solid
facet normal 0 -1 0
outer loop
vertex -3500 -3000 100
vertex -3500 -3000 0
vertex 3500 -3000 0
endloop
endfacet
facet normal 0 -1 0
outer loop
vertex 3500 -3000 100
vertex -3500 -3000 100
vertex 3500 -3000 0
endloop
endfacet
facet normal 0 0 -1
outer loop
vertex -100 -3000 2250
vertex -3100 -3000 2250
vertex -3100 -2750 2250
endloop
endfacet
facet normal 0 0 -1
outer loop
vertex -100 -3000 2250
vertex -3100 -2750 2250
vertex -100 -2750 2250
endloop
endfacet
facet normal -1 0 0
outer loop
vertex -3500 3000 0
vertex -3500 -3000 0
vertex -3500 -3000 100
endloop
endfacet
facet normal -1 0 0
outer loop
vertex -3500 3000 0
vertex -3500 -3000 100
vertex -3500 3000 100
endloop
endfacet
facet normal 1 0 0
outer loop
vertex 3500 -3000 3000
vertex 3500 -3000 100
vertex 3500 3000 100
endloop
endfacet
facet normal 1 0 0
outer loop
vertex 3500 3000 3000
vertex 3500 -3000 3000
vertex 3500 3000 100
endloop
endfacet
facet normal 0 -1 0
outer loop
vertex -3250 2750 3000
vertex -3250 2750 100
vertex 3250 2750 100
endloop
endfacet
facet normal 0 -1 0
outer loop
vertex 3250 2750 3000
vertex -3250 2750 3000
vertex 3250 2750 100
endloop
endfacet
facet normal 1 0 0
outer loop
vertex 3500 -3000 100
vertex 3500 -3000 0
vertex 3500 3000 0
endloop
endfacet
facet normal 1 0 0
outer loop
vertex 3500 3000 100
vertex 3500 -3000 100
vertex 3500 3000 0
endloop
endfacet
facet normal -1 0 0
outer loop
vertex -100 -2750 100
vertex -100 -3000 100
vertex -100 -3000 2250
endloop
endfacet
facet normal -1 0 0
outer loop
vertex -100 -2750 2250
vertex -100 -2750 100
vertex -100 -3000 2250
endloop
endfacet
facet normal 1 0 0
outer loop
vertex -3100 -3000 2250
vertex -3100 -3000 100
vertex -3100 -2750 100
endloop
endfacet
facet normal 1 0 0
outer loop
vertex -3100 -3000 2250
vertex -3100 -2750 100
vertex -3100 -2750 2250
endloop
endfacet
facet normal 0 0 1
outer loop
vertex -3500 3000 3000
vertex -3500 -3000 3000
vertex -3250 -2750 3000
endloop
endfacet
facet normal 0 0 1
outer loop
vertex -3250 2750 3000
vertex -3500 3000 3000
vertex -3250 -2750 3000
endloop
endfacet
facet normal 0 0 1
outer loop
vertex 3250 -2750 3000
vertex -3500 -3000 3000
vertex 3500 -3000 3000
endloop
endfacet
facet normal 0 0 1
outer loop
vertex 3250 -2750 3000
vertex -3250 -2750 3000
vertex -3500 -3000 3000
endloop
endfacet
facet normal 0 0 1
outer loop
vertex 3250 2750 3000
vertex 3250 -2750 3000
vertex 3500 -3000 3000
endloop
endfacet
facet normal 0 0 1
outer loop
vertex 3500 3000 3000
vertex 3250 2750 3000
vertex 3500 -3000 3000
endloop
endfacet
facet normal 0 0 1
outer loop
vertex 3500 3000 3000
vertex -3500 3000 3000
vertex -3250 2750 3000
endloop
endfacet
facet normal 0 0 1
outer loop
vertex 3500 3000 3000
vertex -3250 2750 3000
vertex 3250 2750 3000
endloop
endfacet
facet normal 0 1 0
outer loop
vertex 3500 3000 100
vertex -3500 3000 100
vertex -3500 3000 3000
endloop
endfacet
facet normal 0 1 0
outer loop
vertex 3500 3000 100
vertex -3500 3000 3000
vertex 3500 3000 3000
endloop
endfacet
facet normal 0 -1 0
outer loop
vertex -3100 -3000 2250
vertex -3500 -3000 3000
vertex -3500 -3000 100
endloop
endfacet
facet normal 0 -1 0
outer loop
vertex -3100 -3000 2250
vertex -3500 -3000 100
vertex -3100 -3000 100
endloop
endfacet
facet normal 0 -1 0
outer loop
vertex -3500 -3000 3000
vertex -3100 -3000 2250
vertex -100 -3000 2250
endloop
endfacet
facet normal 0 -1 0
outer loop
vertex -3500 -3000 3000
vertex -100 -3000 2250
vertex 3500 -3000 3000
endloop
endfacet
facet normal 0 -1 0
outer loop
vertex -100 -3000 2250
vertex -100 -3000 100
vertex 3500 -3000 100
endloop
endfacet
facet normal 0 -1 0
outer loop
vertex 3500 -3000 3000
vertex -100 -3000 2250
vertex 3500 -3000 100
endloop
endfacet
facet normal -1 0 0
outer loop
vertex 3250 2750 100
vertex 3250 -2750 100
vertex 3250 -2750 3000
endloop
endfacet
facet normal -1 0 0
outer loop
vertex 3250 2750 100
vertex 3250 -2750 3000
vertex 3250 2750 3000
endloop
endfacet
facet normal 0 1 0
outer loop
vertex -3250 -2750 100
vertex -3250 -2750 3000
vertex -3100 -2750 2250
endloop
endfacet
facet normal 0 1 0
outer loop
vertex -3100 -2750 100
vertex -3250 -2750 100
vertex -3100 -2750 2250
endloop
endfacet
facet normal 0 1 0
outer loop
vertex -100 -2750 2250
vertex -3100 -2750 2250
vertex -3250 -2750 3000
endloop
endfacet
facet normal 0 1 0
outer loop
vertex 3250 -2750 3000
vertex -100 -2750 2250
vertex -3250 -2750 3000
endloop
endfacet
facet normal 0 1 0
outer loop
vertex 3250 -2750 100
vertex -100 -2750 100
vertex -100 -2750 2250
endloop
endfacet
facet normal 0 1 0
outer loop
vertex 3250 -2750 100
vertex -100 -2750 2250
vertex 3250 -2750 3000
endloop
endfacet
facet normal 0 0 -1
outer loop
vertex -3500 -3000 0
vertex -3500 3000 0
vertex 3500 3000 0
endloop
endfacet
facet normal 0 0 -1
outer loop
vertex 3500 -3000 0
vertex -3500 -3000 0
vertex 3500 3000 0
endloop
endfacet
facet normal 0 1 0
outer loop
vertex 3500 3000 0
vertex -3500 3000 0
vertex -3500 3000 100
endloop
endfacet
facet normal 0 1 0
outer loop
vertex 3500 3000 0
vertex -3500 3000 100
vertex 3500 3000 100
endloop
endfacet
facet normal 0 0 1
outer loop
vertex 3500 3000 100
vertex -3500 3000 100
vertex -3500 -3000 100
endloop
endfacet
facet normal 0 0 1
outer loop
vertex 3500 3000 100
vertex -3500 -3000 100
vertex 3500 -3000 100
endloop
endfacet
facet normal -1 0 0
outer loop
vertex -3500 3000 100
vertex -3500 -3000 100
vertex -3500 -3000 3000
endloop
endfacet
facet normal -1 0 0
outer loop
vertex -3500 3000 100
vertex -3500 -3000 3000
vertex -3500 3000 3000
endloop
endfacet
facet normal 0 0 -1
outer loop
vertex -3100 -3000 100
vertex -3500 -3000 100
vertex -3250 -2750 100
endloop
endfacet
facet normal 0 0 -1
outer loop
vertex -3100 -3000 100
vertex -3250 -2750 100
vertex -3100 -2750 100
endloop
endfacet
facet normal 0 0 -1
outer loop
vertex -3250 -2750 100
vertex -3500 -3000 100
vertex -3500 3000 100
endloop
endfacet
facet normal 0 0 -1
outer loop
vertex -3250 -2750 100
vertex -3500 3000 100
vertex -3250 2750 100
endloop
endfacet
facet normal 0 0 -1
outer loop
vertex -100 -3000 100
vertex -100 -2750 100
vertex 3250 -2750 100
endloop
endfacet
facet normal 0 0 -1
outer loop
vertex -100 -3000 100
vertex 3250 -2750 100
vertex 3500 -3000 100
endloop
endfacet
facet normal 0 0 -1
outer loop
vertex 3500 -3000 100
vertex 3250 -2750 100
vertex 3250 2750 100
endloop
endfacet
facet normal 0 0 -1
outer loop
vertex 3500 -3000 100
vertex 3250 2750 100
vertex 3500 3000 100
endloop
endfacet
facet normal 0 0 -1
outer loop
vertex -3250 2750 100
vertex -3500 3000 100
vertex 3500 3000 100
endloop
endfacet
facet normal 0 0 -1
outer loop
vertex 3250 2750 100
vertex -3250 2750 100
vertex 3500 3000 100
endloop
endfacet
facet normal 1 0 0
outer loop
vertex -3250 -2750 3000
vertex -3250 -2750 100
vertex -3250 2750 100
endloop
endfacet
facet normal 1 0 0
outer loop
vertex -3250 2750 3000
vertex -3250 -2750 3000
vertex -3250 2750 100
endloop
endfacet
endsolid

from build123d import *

# Parameters (mm, degrees)
F0_W     = 7000
F0_H     = 6000
F1_DEPTH = 100
F2_W     = 7000
F2_H     = 6000
F2_W_2   = 6500
F2_H_2   = 5500
F3_DEPTH = 2900
F4_W     = 3000
F4_H     = 2150
F5_DEPTH = 250


with BuildPart() as f1:
    # F0 (on Top) → F1 (new body)
    with BuildSketch(Plane.XY):
        Rectangle(F0_W, F0_H)
    extrude(amount=F1_DEPTH)


with BuildPart() as f3:
    # F2 (on face) → F3 (new body)
    with BuildSketch(Plane.XY.offset(100)):
        Rectangle(F2_W, F2_H)
        Rectangle(F2_W_2, F2_H_2, mode=Mode.SUBTRACT)
    extrude(amount=F3_DEPTH)

    # F4 (on face) → F5 (cut, through all)
    with BuildSketch(Plane.XZ.offset(3000)):
        with Locations((-1600, 1175)):
            Rectangle(F4_W, F4_H)
    extrude(amount=-F5_DEPTH, mode=Mode.SUBTRACT)


solid = Compound([f1.part, f3.part])
